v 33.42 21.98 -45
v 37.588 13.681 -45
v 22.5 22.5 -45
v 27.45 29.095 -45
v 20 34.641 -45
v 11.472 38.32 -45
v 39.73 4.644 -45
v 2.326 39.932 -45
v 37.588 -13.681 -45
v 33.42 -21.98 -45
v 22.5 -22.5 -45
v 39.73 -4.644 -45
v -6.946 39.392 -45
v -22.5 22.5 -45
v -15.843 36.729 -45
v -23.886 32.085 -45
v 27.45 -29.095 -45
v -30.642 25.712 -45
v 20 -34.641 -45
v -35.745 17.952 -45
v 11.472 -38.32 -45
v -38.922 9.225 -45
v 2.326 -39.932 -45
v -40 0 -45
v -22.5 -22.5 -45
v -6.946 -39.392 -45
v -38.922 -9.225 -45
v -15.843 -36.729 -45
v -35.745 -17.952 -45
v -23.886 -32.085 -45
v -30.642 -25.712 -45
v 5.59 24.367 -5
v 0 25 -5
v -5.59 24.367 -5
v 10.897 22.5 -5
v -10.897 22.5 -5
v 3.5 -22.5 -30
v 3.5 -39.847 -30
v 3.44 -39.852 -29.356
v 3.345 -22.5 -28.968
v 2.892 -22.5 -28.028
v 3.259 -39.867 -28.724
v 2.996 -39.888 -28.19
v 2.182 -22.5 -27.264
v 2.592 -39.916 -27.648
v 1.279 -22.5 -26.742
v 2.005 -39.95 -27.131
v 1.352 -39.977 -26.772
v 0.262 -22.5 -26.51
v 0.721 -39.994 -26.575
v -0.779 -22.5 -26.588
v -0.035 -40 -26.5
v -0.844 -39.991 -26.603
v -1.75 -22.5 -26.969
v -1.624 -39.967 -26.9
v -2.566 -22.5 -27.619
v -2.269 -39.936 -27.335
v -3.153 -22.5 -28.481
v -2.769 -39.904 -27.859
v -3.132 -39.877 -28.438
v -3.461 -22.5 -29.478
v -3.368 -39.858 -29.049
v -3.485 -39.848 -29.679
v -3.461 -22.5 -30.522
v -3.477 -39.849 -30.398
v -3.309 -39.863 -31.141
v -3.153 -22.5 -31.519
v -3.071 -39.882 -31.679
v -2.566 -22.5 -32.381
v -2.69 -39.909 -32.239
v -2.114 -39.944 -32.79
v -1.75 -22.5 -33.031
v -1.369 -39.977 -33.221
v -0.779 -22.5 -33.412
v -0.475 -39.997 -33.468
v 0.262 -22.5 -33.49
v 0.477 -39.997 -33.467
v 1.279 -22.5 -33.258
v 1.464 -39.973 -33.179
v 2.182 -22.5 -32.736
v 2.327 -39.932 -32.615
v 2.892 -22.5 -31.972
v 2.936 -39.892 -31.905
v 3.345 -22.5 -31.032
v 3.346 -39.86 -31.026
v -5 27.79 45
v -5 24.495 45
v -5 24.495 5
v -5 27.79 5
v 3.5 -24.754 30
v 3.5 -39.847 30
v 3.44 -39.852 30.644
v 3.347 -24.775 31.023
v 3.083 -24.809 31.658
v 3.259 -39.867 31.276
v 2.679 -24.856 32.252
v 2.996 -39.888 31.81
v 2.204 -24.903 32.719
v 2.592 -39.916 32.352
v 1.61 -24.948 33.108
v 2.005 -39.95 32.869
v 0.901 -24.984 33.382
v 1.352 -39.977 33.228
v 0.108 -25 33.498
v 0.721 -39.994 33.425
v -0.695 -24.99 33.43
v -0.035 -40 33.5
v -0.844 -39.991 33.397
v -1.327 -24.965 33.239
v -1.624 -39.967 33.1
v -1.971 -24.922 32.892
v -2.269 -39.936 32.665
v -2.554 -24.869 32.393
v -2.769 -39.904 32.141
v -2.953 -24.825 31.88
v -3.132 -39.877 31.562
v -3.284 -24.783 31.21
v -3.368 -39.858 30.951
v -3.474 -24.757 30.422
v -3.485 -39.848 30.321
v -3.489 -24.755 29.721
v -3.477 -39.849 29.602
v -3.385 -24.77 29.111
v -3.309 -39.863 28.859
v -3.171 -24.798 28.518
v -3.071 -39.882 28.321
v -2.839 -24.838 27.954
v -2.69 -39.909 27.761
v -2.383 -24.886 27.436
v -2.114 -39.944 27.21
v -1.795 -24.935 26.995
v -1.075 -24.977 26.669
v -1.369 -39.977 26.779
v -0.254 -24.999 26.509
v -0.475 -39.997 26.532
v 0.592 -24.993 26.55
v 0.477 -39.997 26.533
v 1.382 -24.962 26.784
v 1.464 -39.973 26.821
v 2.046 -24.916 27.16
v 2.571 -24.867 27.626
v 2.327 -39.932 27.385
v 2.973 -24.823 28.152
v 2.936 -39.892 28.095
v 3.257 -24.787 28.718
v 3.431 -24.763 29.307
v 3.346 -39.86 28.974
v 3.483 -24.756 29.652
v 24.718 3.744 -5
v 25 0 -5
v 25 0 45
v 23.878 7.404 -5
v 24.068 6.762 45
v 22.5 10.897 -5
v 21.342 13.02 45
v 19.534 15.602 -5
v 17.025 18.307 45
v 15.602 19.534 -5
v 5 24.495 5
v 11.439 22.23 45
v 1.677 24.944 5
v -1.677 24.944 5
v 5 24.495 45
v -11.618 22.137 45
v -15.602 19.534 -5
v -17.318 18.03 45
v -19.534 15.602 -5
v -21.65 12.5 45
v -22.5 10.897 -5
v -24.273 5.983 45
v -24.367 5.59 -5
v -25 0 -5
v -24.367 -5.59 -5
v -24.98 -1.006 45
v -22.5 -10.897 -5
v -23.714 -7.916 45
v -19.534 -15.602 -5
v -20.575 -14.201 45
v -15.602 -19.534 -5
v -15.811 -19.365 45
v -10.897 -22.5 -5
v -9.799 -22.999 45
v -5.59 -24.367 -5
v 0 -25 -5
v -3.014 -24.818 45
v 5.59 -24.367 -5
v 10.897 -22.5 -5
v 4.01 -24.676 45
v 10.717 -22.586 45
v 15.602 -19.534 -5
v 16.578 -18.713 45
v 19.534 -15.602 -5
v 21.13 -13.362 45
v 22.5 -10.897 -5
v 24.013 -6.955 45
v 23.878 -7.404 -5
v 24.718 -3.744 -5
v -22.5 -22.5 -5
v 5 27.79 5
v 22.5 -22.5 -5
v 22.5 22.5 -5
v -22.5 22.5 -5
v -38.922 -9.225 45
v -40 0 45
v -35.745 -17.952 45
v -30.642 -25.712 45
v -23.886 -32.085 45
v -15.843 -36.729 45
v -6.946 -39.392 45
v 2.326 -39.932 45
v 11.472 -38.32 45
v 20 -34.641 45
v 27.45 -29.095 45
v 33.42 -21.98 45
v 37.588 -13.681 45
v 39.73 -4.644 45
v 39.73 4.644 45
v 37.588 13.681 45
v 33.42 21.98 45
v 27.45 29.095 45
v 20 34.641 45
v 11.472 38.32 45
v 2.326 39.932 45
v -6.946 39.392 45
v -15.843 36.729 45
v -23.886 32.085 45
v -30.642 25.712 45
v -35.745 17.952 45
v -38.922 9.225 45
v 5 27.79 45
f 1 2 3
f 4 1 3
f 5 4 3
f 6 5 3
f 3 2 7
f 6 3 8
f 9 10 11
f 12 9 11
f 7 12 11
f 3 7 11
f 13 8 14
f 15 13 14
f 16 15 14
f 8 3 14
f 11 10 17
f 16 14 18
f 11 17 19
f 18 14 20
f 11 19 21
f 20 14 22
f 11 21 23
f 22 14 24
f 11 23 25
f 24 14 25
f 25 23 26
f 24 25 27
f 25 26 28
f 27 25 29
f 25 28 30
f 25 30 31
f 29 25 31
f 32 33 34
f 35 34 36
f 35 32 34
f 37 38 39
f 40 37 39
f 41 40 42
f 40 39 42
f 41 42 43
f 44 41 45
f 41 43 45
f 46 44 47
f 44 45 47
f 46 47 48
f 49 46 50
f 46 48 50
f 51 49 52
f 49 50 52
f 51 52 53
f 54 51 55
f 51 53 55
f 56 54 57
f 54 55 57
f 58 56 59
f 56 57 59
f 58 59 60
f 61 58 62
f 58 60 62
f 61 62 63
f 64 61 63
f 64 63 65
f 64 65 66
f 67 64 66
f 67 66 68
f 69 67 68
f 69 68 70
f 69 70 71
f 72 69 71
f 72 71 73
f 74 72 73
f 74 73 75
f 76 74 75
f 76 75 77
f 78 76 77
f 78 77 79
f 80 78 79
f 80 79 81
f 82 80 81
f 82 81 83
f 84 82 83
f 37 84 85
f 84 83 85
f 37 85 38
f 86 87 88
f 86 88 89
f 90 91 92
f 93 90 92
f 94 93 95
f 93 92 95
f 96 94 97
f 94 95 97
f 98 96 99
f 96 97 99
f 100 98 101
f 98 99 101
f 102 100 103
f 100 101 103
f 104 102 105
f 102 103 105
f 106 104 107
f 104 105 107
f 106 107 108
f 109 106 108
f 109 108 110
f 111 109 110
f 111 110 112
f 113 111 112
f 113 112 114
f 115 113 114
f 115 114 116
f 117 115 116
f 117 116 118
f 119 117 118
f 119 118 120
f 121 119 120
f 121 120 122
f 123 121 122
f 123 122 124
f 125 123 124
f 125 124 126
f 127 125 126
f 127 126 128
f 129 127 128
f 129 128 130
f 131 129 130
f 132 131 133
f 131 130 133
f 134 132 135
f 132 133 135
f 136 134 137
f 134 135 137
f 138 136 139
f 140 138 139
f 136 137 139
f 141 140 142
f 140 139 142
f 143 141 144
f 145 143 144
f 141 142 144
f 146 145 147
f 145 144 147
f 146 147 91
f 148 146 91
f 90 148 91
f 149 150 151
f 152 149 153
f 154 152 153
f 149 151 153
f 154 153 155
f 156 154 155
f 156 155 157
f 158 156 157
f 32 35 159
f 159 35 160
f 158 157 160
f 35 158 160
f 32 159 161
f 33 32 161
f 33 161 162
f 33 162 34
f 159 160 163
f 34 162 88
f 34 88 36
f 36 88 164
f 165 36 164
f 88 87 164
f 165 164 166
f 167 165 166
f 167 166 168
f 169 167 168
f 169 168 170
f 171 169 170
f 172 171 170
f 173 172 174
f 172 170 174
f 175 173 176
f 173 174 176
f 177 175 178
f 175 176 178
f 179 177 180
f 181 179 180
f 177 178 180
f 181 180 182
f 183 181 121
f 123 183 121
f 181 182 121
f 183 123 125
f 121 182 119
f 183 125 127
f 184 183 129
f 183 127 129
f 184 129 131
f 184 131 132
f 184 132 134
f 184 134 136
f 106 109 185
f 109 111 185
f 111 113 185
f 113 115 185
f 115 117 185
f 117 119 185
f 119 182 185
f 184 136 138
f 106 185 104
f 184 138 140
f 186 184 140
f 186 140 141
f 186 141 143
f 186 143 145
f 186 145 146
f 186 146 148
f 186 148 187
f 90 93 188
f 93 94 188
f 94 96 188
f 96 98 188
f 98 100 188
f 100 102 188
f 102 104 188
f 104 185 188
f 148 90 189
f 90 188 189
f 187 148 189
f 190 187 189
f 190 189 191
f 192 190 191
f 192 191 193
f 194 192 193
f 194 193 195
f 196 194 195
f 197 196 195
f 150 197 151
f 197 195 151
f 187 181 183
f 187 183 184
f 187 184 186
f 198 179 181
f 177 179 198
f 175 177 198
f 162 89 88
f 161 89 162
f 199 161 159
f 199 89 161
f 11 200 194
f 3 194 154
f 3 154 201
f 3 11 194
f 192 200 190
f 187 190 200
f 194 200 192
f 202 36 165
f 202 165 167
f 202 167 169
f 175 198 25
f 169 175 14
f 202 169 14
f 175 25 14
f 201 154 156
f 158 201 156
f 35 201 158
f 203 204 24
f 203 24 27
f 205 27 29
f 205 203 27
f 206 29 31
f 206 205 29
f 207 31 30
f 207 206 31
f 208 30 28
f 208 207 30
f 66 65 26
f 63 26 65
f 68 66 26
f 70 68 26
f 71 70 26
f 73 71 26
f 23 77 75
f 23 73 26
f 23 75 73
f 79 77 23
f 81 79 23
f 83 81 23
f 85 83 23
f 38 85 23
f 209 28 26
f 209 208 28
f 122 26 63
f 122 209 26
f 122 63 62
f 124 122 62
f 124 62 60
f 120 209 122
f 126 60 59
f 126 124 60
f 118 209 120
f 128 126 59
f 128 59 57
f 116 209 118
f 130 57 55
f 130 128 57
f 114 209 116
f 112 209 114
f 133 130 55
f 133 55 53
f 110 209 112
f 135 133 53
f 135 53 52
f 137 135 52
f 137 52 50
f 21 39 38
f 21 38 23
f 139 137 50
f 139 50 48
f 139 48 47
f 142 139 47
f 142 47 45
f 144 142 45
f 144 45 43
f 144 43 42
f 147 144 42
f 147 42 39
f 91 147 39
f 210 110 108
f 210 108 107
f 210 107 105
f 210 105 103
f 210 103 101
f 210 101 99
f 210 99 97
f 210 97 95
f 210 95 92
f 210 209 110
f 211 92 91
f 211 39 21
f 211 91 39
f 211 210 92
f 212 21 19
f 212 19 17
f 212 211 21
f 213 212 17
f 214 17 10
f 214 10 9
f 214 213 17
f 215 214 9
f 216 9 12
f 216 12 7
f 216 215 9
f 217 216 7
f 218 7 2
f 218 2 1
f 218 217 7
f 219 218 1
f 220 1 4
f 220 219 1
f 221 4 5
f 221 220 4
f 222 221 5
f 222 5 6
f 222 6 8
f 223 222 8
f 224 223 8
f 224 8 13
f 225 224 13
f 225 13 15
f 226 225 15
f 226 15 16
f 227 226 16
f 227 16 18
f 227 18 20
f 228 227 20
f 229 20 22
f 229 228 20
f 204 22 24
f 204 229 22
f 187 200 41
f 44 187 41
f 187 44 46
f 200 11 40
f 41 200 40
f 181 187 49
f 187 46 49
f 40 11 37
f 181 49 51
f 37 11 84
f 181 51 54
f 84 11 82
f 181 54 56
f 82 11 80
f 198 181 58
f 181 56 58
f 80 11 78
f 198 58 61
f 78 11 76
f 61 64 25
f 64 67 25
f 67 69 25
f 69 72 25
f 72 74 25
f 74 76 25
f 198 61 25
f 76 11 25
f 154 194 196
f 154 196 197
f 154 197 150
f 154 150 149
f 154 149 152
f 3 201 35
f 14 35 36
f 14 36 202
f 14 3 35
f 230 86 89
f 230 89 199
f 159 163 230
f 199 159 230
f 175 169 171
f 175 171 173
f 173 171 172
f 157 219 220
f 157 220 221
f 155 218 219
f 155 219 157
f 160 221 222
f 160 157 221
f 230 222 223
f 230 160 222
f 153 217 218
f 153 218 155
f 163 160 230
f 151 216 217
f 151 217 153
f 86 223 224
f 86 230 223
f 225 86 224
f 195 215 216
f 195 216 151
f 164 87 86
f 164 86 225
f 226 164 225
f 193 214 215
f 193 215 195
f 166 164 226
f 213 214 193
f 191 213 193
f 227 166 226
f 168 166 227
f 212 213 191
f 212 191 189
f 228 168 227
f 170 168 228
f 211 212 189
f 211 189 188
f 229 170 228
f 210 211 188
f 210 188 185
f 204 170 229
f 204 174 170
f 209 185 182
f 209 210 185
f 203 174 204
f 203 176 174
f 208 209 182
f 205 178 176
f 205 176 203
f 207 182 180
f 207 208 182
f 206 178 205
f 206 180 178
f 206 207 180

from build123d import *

# Parameters (mm, degrees)
SKETCH1_R           = 40
BOSS_EXTRUDE1_DEPTH = 45
SKETCH2_R           = 25
CUT_EXTRUDE1_DEPTH  = 50
SKETCH3_W           = 45
SKETCH3_H           = 45
CUT_EXTRUDE2_DEPTH  = 40
SKETCH4_W           = 10
SKETCH4_H           = 12
CUT_EXTRUDE3_DEPTH  = 40
SKETCH5_R           = 3.5
CUT_EXTRUDE4_DEPTH  = 30


with BuildPart() as part:
    # Sketch1 → Boss-Extrude1 (new, symmetric)
    with BuildSketch(Plane.XY):
        with Locations(Location((0, 0, 0), (0, 0, 180))):
            Circle(SKETCH1_R)
    extrude(amount=BOSS_EXTRUDE1_DEPTH, both=True)

    # Sketch2 → Cut-Extrude1 (cut)
    with BuildSketch(Plane.XY.offset(45)):
        Circle(SKETCH2_R)
    extrude(amount=-CUT_EXTRUDE1_DEPTH, mode=Mode.SUBTRACT)

    # Sketch3 → Cut-Extrude2 (cut)
    with BuildSketch(Plane(origin=(0, 0, -45), x_dir=(-1, 0, 0), z_dir=(0, 0, -1))):
        Rectangle(SKETCH3_W, SKETCH3_H)
    extrude(amount=-CUT_EXTRUDE2_DEPTH, mode=Mode.SUBTRACT)

    # Sketch4 → Cut-Extrude3 (cut)
    with BuildSketch(Plane.XY.offset(45)):
        with Locations((0, 21.79)):
            Rectangle(SKETCH4_W, SKETCH4_H)
    extrude(amount=-CUT_EXTRUDE3_DEPTH, mode=Mode.SUBTRACT)

    # Sketch5 → Cut-Extrude4 (cut)
    with BuildSketch(Plane(origin=(0, -40, 45), x_dir=(-1, 0, 0), z_dir=(0, -1, 0))):
        with Locations(Location((0, 15, 0), (0, 0, 180))):
            Circle(SKETCH5_R)
        with Locations(Location((0, 75, 0), (0, 0, 180))):
            Circle(SKETCH5_R)
    extrude(amount=-CUT_EXTRUDE4_DEPTH, mode=Mode.SUBTRACT)


solid = part.part
